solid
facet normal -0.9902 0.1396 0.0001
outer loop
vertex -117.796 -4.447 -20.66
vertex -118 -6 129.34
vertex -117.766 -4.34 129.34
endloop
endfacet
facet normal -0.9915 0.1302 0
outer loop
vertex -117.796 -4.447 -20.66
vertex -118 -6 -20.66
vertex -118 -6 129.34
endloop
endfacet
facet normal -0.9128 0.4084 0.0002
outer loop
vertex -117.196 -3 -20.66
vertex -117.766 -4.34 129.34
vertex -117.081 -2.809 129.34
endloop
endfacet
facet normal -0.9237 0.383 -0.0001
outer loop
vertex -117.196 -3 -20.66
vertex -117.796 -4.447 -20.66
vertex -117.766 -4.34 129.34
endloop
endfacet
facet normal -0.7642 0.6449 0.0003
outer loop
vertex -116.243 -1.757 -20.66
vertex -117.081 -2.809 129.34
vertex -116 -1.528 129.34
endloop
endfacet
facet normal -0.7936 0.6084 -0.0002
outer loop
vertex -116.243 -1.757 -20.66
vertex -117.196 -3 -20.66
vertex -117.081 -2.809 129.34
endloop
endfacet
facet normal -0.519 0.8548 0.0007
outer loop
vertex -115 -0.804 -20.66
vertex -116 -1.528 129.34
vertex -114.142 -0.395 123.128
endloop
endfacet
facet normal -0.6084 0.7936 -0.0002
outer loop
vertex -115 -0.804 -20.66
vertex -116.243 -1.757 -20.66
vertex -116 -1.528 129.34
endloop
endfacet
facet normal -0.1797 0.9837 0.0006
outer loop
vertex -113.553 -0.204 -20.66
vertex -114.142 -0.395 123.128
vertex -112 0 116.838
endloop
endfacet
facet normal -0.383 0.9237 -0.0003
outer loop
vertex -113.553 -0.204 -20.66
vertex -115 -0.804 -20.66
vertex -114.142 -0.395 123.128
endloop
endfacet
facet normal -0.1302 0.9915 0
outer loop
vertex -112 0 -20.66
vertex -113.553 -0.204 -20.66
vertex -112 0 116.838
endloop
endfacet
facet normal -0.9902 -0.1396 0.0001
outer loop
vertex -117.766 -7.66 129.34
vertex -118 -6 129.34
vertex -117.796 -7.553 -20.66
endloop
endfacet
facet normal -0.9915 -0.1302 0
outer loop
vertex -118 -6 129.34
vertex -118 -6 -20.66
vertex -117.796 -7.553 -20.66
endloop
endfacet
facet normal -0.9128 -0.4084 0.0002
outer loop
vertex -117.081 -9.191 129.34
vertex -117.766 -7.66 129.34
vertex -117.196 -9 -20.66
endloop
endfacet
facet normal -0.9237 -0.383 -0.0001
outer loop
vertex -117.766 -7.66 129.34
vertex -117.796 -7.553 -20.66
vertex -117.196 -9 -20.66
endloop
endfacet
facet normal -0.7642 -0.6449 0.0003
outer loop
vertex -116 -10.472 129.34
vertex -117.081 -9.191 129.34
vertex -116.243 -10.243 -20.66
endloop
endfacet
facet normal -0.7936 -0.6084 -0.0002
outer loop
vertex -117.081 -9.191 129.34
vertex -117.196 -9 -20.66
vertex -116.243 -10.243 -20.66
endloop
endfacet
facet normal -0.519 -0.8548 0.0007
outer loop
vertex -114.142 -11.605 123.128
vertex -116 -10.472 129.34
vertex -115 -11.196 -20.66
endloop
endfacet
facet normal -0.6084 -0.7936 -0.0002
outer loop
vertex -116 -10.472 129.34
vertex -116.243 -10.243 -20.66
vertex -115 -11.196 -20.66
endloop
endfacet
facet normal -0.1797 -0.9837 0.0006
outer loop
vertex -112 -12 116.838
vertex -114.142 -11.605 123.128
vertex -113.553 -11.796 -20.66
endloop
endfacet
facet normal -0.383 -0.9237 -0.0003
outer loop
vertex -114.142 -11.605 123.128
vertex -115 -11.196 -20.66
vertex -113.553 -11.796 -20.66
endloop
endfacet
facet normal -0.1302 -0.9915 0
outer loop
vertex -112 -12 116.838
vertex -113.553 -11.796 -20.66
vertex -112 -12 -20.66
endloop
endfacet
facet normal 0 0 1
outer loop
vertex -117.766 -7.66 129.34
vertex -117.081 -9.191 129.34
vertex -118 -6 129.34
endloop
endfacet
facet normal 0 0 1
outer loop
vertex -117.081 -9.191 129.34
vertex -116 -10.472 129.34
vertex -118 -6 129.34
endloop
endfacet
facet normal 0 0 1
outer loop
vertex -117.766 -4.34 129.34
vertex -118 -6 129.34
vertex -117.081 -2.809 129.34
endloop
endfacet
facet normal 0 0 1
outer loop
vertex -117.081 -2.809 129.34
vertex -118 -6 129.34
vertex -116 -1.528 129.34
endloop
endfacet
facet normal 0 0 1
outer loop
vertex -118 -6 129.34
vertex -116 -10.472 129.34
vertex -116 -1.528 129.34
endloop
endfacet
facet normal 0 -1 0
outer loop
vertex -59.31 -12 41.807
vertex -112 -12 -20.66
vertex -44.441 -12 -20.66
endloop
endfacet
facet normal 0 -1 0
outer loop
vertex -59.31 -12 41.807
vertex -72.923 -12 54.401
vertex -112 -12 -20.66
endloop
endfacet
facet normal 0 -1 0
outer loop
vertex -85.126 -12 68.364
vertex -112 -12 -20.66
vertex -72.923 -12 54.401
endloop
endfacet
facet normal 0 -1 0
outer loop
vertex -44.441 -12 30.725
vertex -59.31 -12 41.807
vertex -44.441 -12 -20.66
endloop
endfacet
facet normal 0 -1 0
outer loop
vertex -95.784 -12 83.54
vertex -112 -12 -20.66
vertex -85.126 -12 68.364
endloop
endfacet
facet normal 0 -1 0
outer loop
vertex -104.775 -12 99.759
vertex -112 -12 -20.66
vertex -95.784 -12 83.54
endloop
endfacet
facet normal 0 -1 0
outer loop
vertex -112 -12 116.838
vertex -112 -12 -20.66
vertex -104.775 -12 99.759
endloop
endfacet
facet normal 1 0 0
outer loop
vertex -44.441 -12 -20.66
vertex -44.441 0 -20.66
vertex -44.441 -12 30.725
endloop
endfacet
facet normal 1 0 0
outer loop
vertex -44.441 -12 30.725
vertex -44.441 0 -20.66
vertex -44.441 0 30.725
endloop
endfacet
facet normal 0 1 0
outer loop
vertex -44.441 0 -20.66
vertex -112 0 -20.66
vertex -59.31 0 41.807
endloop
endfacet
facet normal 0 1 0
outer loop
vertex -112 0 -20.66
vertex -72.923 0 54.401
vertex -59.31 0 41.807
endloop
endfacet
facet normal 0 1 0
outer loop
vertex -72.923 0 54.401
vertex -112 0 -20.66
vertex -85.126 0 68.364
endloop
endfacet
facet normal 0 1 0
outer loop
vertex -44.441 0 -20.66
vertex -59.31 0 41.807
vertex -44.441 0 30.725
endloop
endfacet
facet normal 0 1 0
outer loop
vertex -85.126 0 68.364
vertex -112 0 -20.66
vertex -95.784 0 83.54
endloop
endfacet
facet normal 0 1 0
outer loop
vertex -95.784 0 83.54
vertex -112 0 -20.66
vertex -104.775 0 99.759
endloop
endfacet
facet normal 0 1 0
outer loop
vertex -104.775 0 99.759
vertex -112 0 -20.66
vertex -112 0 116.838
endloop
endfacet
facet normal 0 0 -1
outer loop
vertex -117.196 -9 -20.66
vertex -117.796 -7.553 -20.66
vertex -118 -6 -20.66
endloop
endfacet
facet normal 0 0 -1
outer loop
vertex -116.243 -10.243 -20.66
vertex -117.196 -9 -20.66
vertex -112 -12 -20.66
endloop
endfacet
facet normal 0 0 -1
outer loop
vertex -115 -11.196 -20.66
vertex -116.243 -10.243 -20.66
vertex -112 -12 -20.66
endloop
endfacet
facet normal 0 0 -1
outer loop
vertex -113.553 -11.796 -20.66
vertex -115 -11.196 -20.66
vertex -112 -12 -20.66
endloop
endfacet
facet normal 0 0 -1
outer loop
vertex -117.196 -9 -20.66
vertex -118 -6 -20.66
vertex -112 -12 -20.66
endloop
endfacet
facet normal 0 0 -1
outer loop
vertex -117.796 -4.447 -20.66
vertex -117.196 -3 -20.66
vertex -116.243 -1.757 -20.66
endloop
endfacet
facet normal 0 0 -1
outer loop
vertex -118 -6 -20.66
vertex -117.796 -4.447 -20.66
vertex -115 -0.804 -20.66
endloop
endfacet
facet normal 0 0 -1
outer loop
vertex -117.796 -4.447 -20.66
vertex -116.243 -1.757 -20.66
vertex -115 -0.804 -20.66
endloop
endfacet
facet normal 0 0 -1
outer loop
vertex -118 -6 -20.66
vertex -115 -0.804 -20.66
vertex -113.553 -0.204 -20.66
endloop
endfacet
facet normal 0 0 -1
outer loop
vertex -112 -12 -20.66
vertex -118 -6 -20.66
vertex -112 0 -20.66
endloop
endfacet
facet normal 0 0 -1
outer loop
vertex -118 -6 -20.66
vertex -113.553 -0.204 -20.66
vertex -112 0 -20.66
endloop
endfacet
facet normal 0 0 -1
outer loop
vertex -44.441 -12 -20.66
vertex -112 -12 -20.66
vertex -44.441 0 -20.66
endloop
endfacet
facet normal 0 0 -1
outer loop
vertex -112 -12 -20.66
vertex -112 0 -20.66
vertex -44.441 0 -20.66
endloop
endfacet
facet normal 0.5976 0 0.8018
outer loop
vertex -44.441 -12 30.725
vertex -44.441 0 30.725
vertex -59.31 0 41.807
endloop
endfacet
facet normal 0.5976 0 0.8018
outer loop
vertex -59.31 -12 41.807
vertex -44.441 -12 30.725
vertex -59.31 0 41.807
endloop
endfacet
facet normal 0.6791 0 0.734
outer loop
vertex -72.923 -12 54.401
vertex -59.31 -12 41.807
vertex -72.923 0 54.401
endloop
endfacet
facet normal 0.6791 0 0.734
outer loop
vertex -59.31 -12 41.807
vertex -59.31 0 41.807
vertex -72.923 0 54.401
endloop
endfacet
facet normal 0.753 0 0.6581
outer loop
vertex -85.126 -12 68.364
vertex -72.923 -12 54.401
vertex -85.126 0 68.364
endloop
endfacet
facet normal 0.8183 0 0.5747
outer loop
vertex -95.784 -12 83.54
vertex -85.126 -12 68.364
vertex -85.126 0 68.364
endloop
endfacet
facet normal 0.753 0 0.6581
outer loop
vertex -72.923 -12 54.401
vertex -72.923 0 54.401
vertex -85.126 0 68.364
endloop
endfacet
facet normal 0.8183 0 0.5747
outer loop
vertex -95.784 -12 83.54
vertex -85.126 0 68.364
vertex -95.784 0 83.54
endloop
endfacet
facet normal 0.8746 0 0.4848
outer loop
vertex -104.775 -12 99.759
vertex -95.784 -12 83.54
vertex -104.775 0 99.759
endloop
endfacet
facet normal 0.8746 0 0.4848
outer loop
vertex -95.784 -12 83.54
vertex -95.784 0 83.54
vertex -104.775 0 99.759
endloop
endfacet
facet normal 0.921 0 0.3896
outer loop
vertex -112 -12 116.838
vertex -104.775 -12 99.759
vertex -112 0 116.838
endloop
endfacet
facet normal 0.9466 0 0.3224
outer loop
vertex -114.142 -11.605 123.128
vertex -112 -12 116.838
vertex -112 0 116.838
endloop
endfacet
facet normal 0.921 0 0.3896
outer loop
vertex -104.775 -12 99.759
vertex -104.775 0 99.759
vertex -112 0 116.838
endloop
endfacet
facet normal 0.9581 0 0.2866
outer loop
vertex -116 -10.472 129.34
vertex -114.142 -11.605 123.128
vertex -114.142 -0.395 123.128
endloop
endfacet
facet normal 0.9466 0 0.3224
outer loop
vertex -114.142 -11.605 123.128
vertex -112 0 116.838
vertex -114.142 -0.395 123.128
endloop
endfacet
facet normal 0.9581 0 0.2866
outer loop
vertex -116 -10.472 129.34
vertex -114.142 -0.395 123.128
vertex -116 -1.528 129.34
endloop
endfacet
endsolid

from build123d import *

# Parameters (mm, degrees)
F1_DEPTH = 12
F2_R     = 5.99999


# Not quite as in the source:
# - a fillet or chamfer is up to 0.001 mm smaller than in the source, because OpenCascade refuses the exact size


with BuildPart() as f1:
    # F0 (on Front) → F1 (new body)
    with BuildSketch(Plane.XZ):
        with BuildLine():
            Line((-118, -20.6604213454), (-44.4413209303, -20.6604213454))
            Line((-44.4413209303, -20.6604213454), (-44.4413209303, 30.7246802683))
            ThreePointArc((-44.4413209303, 30.7246802683), (-89.0802193772, 73.6033003164), (-116, 129.3395786546))
            Line((-116, 129.3395786546), (-118, 129.3395786546))
            Line((-118, 129.3395786546), (-118, -20.6604213454))
        make_face()
    extrude(amount=F1_DEPTH)

    # F2 (radius 6 in the source; OpenCascade refuses exactly that, so slightly less here)
    f2_edges = [f1.edges().sort_by_distance(p)[0] for p in [
        (-118, 0, 54.339579),
        (-118, -12, 54.339579),
    ]]
    fillet(f2_edges, radius=F2_R)


solid = f1.part
